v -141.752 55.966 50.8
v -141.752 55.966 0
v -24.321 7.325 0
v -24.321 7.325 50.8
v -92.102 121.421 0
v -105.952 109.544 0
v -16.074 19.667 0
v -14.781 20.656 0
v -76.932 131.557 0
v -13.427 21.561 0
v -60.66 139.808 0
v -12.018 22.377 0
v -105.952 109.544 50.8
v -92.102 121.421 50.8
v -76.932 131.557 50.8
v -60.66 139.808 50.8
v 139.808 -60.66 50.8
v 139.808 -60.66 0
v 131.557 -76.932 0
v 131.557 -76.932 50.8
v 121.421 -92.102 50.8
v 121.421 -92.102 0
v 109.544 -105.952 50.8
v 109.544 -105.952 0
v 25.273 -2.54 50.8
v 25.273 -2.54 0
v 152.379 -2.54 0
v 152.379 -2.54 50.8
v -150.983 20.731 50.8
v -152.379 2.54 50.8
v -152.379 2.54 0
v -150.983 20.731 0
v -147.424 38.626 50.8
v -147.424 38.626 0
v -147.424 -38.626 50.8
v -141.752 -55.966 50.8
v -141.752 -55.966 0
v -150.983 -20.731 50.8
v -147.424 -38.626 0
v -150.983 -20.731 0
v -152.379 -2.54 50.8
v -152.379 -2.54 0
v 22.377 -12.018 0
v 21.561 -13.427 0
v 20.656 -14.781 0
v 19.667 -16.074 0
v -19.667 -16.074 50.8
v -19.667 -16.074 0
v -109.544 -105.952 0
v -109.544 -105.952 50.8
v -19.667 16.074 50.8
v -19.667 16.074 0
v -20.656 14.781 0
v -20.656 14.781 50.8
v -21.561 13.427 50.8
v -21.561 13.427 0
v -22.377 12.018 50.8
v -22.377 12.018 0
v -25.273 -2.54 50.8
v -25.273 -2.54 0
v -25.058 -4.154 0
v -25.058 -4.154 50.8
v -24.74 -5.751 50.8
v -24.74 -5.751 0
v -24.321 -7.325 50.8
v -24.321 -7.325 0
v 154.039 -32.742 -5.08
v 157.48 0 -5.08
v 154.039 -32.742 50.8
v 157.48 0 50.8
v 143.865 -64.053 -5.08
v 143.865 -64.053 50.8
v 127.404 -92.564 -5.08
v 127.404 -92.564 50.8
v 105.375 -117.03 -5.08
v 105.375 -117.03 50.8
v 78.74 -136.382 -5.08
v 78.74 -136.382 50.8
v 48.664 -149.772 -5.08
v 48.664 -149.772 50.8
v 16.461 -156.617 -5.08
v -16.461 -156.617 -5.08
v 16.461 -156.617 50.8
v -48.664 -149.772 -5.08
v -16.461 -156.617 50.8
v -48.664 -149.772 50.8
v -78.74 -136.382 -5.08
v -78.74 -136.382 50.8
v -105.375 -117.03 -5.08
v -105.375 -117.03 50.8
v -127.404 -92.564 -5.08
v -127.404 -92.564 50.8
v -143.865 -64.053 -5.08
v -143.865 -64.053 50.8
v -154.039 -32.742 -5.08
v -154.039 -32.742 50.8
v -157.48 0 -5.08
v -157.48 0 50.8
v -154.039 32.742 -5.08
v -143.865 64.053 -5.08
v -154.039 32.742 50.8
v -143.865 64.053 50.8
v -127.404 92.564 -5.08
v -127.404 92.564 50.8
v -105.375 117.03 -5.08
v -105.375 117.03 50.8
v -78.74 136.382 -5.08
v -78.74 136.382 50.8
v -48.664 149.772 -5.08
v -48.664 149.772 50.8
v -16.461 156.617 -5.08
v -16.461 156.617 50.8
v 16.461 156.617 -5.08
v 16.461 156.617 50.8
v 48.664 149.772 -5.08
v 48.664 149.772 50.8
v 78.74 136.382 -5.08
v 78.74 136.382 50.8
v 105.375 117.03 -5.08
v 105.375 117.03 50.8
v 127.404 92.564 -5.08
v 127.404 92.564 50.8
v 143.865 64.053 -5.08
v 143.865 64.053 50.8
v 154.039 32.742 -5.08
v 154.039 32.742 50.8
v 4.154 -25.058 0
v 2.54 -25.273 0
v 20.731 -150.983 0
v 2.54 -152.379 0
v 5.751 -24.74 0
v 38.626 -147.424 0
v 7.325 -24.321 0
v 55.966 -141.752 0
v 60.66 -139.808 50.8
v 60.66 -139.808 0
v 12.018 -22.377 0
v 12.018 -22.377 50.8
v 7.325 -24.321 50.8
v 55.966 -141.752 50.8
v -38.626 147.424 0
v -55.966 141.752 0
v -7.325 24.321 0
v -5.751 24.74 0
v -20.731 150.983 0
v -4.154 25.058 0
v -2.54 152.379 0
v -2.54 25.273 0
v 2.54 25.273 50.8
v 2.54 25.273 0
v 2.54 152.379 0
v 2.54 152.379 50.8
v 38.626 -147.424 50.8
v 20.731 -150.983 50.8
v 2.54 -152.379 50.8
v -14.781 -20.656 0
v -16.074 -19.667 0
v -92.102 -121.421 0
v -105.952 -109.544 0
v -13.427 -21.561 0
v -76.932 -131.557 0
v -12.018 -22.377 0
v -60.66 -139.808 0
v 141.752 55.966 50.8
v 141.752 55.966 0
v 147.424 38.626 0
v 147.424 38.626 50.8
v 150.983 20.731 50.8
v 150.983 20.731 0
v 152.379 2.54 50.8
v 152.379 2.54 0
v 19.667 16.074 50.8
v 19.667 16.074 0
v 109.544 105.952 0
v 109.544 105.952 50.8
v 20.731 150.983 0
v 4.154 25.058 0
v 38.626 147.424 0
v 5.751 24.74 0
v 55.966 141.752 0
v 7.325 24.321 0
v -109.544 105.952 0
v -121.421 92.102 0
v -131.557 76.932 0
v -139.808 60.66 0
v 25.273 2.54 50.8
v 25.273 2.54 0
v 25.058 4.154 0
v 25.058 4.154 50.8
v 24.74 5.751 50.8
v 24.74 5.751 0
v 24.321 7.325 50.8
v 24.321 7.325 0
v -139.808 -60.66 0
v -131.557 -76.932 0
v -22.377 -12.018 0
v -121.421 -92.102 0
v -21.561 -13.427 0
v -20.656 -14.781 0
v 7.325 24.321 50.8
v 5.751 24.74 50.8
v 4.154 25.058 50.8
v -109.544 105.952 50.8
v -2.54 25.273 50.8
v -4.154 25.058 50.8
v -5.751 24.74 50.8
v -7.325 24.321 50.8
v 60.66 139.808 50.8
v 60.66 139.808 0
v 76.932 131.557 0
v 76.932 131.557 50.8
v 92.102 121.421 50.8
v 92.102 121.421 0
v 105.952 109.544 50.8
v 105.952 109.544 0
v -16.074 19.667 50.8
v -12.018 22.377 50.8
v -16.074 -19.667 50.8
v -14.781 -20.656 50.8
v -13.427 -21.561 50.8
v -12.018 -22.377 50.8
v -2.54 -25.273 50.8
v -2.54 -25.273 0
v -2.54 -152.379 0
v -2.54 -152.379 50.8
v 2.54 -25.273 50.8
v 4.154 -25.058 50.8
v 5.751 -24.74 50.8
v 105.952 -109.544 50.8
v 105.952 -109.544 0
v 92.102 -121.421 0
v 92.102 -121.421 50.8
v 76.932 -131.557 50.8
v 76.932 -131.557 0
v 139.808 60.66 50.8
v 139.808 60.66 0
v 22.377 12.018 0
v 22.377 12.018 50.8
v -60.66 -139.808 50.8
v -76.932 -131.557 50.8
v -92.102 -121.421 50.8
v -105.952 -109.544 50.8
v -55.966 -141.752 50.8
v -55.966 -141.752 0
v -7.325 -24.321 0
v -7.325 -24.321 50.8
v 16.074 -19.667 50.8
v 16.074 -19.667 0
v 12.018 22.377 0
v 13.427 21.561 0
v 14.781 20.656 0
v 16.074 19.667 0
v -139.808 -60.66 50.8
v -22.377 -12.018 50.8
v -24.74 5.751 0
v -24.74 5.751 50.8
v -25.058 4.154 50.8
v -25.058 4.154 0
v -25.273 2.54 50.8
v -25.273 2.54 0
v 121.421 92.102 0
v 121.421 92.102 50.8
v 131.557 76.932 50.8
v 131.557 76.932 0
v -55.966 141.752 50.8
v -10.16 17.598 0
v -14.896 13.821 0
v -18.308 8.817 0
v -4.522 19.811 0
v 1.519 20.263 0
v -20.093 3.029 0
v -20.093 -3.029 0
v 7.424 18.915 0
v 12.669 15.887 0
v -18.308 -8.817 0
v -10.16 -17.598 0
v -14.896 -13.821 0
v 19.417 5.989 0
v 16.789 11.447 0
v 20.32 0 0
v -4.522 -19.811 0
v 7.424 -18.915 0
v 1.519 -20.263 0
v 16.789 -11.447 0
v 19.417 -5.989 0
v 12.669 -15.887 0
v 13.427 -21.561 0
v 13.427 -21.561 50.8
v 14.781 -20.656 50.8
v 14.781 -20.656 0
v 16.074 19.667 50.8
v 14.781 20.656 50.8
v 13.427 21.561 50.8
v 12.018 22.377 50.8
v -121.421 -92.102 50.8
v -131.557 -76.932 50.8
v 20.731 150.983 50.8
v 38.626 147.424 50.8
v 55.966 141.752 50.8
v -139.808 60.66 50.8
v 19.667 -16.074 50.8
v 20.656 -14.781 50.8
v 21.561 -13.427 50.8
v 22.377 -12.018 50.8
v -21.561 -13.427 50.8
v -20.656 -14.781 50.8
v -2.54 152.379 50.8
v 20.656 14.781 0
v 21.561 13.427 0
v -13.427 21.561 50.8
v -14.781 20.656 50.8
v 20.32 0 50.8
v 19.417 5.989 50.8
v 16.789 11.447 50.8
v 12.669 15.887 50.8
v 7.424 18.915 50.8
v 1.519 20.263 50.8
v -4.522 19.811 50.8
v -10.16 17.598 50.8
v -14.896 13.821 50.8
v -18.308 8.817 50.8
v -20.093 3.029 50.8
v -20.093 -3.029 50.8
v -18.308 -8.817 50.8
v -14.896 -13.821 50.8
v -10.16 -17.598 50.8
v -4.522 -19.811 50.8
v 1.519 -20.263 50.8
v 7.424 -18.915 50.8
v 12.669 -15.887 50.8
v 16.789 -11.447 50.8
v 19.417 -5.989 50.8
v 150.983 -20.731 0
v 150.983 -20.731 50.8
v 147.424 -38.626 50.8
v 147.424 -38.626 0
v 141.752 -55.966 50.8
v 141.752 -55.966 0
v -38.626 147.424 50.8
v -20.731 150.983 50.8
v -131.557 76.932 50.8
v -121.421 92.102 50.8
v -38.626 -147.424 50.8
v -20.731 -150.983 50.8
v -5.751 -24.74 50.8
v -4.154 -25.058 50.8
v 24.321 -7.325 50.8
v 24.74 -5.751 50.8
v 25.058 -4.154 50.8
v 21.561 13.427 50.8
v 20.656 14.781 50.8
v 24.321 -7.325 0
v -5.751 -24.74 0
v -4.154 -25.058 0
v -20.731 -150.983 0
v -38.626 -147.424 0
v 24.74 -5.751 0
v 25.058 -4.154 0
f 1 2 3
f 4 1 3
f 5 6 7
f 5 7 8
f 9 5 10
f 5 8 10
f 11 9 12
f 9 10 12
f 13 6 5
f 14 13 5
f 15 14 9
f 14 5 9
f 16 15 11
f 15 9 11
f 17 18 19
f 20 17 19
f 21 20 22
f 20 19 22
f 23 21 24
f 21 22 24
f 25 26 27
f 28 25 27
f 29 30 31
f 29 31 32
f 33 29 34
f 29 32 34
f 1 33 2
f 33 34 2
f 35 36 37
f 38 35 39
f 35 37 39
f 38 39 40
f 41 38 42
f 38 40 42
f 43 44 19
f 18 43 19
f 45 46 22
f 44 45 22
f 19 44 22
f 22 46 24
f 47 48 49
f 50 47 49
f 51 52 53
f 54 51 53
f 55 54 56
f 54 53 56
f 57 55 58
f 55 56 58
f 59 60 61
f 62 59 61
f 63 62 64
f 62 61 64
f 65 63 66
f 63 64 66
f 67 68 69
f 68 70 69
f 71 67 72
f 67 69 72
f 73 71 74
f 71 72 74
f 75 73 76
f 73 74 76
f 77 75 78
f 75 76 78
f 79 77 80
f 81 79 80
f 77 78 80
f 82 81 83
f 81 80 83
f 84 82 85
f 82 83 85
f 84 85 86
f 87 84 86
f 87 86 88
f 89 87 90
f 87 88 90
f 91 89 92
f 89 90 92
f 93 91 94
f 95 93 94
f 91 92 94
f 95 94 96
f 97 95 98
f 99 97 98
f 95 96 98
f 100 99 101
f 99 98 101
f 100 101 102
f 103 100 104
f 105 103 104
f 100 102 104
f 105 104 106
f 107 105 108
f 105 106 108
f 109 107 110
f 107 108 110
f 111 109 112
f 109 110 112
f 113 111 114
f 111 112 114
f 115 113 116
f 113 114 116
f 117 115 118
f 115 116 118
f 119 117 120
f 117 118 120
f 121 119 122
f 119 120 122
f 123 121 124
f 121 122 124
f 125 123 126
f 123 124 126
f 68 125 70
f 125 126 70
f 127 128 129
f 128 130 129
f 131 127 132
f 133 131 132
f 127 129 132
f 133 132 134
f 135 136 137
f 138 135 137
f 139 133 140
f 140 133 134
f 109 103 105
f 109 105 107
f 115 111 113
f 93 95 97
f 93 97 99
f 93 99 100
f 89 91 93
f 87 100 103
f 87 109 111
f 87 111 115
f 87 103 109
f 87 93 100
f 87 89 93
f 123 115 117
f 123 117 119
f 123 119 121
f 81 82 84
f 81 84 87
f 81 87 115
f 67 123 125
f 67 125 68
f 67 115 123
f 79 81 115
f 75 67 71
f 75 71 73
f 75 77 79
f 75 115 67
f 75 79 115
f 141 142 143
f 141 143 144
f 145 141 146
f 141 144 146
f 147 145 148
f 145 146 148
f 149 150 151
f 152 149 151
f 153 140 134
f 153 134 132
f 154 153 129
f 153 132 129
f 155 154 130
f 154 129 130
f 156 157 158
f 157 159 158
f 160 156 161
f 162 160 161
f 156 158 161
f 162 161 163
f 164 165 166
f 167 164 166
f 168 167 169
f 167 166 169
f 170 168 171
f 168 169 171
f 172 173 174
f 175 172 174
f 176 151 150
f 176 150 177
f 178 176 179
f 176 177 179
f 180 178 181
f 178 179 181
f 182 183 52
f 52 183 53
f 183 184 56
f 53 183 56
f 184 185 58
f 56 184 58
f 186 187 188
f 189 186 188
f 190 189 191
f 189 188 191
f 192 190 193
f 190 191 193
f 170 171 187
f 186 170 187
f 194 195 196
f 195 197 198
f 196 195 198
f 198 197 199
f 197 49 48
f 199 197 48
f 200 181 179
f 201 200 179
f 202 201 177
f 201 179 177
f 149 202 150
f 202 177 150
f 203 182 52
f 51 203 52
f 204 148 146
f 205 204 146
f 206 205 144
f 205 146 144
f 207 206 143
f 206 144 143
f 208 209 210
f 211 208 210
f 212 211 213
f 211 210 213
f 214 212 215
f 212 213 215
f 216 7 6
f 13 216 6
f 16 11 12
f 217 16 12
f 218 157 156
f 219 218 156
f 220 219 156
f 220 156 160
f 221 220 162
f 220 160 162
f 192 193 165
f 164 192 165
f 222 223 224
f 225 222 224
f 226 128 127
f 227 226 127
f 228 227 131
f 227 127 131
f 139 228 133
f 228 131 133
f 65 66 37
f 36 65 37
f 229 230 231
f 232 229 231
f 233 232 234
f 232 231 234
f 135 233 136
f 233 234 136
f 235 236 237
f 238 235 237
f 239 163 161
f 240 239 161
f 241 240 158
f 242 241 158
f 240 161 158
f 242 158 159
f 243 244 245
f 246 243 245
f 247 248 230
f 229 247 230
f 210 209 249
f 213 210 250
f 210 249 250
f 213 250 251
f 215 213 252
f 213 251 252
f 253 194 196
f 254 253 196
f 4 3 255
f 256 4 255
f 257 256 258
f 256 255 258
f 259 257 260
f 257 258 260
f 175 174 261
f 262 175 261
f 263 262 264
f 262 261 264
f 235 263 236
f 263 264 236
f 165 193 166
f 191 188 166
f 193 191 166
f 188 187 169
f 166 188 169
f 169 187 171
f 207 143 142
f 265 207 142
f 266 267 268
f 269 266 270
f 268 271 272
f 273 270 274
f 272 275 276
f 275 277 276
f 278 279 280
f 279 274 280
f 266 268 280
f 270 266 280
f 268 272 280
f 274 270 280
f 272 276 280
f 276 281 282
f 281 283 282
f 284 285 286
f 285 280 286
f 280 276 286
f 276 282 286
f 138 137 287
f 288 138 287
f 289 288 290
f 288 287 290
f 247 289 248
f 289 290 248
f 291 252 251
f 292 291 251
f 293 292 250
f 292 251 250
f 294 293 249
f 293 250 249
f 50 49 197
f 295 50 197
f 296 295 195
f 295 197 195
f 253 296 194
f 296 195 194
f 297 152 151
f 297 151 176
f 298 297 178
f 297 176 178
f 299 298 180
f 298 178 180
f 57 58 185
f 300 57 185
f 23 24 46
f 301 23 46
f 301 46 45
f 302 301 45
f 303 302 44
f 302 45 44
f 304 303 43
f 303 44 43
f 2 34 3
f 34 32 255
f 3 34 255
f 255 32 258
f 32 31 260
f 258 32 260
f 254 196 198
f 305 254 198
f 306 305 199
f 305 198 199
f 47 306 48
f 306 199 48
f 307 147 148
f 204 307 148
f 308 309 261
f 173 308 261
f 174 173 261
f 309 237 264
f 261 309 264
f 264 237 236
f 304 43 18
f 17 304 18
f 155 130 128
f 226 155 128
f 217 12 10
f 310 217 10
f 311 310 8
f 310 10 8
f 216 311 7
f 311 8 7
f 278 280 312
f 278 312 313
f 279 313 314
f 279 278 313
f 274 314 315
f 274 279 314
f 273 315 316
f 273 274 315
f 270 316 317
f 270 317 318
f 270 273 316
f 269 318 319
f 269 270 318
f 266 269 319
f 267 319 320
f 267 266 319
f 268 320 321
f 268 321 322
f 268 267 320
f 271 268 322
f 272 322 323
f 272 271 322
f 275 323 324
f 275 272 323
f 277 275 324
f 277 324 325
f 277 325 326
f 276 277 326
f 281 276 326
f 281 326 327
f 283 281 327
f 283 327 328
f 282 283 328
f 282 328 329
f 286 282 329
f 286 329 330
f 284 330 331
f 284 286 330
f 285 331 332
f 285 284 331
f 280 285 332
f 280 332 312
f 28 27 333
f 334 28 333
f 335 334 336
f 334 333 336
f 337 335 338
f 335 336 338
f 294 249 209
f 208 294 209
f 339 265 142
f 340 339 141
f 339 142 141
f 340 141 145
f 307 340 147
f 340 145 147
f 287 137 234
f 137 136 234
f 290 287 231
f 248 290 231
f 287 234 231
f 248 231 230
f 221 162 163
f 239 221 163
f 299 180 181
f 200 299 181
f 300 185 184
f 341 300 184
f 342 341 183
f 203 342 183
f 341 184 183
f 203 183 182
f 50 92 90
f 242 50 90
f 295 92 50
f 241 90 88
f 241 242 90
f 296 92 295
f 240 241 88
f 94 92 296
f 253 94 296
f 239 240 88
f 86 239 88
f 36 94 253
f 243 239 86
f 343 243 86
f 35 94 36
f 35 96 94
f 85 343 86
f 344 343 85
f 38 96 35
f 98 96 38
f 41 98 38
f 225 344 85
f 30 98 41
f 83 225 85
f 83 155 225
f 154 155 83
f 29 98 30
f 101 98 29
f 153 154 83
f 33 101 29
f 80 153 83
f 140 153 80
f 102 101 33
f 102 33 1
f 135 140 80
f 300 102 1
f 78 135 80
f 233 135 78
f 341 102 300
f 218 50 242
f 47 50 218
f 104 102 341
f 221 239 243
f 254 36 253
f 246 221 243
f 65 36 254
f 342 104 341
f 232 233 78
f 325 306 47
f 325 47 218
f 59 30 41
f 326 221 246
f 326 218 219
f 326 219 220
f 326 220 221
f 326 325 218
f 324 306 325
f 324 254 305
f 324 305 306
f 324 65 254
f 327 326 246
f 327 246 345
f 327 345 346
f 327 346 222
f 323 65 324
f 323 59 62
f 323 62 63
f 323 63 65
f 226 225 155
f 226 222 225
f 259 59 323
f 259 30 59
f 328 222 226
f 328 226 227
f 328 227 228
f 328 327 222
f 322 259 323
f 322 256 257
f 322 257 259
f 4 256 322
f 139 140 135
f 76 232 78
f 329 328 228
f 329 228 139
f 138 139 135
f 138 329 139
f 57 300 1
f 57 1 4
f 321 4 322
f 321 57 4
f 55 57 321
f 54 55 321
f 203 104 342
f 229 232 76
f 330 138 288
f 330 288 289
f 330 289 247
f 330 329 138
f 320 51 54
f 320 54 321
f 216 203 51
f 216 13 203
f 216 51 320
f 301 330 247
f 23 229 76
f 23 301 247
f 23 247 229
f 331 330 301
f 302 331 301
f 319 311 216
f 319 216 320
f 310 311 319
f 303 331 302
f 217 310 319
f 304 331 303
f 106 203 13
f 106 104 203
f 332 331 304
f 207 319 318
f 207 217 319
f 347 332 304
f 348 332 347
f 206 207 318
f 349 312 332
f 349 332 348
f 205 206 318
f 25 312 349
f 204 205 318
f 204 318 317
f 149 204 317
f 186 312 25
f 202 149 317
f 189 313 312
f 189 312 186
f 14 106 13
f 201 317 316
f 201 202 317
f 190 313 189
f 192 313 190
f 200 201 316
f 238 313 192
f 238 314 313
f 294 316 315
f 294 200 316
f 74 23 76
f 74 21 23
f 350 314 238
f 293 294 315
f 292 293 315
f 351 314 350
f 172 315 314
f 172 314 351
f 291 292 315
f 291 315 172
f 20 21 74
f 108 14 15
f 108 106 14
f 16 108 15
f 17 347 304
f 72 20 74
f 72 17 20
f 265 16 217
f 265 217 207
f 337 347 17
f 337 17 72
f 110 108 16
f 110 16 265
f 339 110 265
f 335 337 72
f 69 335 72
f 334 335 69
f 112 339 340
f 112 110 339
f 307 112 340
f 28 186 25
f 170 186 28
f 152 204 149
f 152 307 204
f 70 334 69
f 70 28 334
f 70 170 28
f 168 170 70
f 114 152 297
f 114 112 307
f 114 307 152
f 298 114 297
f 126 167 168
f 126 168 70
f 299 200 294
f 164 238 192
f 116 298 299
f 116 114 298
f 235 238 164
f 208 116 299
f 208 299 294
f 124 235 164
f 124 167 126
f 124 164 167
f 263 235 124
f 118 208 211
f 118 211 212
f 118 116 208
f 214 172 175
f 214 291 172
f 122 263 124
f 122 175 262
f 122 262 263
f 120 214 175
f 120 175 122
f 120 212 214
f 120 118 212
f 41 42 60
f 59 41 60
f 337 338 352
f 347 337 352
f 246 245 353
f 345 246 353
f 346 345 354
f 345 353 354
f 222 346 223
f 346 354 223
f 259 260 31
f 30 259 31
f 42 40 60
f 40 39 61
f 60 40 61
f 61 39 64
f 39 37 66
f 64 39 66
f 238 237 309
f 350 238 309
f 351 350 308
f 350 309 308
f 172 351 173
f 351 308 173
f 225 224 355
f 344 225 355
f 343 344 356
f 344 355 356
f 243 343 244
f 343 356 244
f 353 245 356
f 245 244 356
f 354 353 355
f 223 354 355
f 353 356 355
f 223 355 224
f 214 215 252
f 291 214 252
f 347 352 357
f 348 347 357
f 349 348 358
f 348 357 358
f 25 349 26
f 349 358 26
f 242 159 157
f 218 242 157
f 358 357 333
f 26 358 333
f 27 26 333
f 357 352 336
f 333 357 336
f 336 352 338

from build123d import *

# Parameters (mm, degrees)
F0_R     = 157.48
F0_R_2   = 20.32
F1_DEPTH = 50.8
F2_R     = 157.48
F3_DEPTH = 5.08


with BuildPart() as f1:
    # F0 (on Top) → F1 (new body)
    with BuildSketch(Plane.XY):
        Circle(F0_R)
        with BuildLine():
            ThreePointArc((152.3788318632, 2.54), (152.3947078739, 1.2700441026), (152.4, 0))
            ThreePointArc((152.4, 0), (152.3947078739, -1.2700441026), (152.3788318632, -2.54))
            ThreePointArc((152.3788318632, -2.54), (149.4716767335, -29.7317650753), (141.7516998646, -55.9662003846))
            ThreePointArc((141.7516998646, -55.9662003846), (140.7992407547, -58.3209550924), (139.8076680282, -60.6595084097))
            ThreePointArc((139.8076680282, -60.6595084097), (126.7159689149, -84.6689035121), (109.544156544, -105.9520540955))
            ThreePointArc((109.544156544, -105.9520540955), (107.7630734528, -107.7630734528), (105.9520540956, -109.544156544))
            ThreePointArc((105.9520540956, -109.544156544), (84.6689035122, -126.7159689149), (60.6595084097, -139.8076680282))
            ThreePointArc((60.6595084097, -139.8076680282), (58.3209550924, -140.7992407547), (55.9662003846, -141.7516998646))
            ThreePointArc((55.9662003846, -141.7516998646), (29.7317650753, -149.4716767335), (2.54, -152.3788318632))
            ThreePointArc((2.54, -152.3788318632), (0, -152.4), (-2.54, -152.3788318632))
            ThreePointArc((-2.54, -152.3788318632), (-29.7317650753, -149.4716767335), (-55.9662003846, -141.7516998646))
            ThreePointArc((-55.9662003846, -141.7516998646), (-58.3209550924, -140.7992407547), (-60.6595084098, -139.8076680282))
            ThreePointArc((-60.6595084098, -139.8076680282), (-84.6689035122, -126.7159689149), (-105.9520540955, -109.544156544))
            ThreePointArc((-105.9520540955, -109.544156544), (-107.7630734528, -107.7630734528), (-109.544156544, -105.9520540955))
            ThreePointArc((-109.544156544, -105.9520540955), (-126.7159689149, -84.6689035122), (-139.8076680282, -60.6595084098))
            ThreePointArc((-139.8076680282, -60.6595084098), (-140.7992407547, -58.3209550924), (-141.7516998646, -55.9662003846))
            ThreePointArc((-141.7516998646, -55.9662003846), (-149.4716767335, -29.7317650752), (-152.3788318632, -2.54))
            ThreePointArc((-152.3788318632, -2.54), (-152.4, 0), (-152.3788318632, 2.54))
            ThreePointArc((-152.3788318632, 2.54), (-149.4716767335, 29.7317650752), (-141.7516998646, 55.9662003846))
            ThreePointArc((-141.7516998646, 55.9662003846), (-140.7992407547, 58.3209550924), (-139.8076680282, 60.6595084098))
            ThreePointArc((-139.8076680282, 60.6595084098), (-126.7159689149, 84.6689035122), (-109.544156544, 105.9520540955))
            ThreePointArc((-109.544156544, 105.9520540955), (-107.7630734529, 107.7630734528), (-105.9520540956, 109.544156544))
            ThreePointArc((-105.9520540956, 109.544156544), (-84.6689035122, 126.7159689149), (-60.6595084098, 139.8076680282))
            ThreePointArc((-60.6595084098, 139.8076680282), (-58.3209550924, 140.7992407547), (-55.9662003846, 141.7516998646))
            ThreePointArc((-55.9662003846, 141.7516998646), (-29.7317650752, 149.4716767335), (-2.54, 152.3788318632))
            ThreePointArc((-2.54, 152.3788318632), (0, 152.4), (2.54, 152.3788318632))
            ThreePointArc((2.54, 152.3788318632), (29.7317650752, 149.4716767335), (55.9662003846, 141.7516998646))
            ThreePointArc((55.9662003846, 141.7516998646), (58.3209550924, 140.7992407547), (60.6595084098, 139.8076680282))
            ThreePointArc((60.6595084098, 139.8076680282), (84.6689035122, 126.7159689149), (105.9520540956, 109.544156544))
            ThreePointArc((105.9520540956, 109.544156544), (107.7630734528, 107.7630734528), (109.544156544, 105.9520540956))
            ThreePointArc((109.544156544, 105.9520540956), (126.7159689149, 84.6689035122), (139.8076680282, 60.6595084098))
            ThreePointArc((139.8076680282, 60.6595084098), (140.7992407547, 58.3209550924), (141.7516998646, 55.9662003846))
            ThreePointArc((141.7516998646, 55.9662003846), (149.4716767335, 29.7317650753), (152.3788318632, 2.54))
        make_face(mode=Mode.SUBTRACT)
        with BuildLine():
            Line((-7.3247822603, 24.3209285357), (-55.9662003846, 141.7516998646))
            ThreePointArc((-55.9662003846, 141.7516998646), (-58.3209550924, 140.7992407547), (-60.6595084098, 139.8076680282))
            Line((-60.6595084098, 139.8076680282), (-12.0180902854, 22.3768966993))
            ThreePointArc((-12.0180902854, 22.3768966993), (-9.7201591821, 23.4665401258), (-7.3247822603, 24.3209285357))
        make_face()
        with BuildLine():
            Line((-16.0744328207, 19.6665352691), (-105.9520540956, 109.5441565439))
            ThreePointArc((-105.9520540956, 109.544156544), (-107.7630734529, 107.7630734528), (-109.544156544, 105.9520540955))
            Line((-109.544156544, 105.9520540955), (-19.6665352691, 16.0744328207))
            ThreePointArc((-19.6665352691, 16.0744328207), (-17.9605122421, 17.9605122421), (-16.0744328207, 19.6665352691))
        make_face()
        with BuildLine():
            Line((-22.3768966993, 12.0180902854), (-139.8076680282, 60.6595084098))
            ThreePointArc((-139.8076680282, 60.6595084098), (-140.7992407547, 58.3209550924), (-141.7516998646, 55.9662003846))
            Line((-141.7516998646, 55.9662003846), (-24.3209285357, 7.3247822603))
            ThreePointArc((-24.3209285357, 7.3247822603), (-23.4665401258, 9.7201591821), (-22.3768966993, 12.0180902854))
        make_face()
        with BuildLine():
            Line((-25.2726809025, 2.54), (-152.3788318632, 2.54))
            ThreePointArc((-152.3788318632, 2.54), (-152.4, 0), (-152.3788318632, -2.54))
            Line((-152.3788318632, -2.54), (-25.2726809025, -2.54))
            ThreePointArc((-25.2726809025, -2.54), (-25.4, 0), (-25.2726809025, 2.54))
        make_face()
        with BuildLine():
            ThreePointArc((-141.7516998646, -55.9662003846), (-140.7992407547, -58.3209550924), (-139.8076680282, -60.6595084098))
            Line((-139.8076680282, -60.6595084098), (-22.3768966993, -12.0180902854))
            ThreePointArc((-22.3768966993, -12.0180902854), (-23.4665401258, -9.7201591821), (-24.3209285357, -7.3247822603))
            Line((-24.3209285357, -7.3247822603), (-141.7516998646, -55.9662003846))
        make_face()
        with BuildLine():
            ThreePointArc((-109.544156544, -105.9520540955), (-107.7630734528, -107.7630734528), (-105.9520540955, -109.544156544))
            Line((-105.9520540955, -109.544156544), (-16.0744328207, -19.6665352692))
            ThreePointArc((-16.0744328207, -19.6665352692), (-17.9605122421, -17.9605122421), (-19.6665352691, -16.0744328207))
            Line((-19.6665352691, -16.0744328207), (-109.544156544, -105.9520540955))
        make_face()
        with BuildLine():
            ThreePointArc((-60.6595084098, -139.8076680282), (-58.3209550924, -140.7992407547), (-55.9662003846, -141.7516998646))
            Line((-55.9662003846, -141.7516998646), (-7.3247822603, -24.3209285357))
            ThreePointArc((-7.3247822603, -24.3209285357), (-9.7201591821, -23.4665401258), (-12.0180902854, -22.3768966993))
            Line((-12.0180902854, -22.3768966993), (-60.6595084098, -139.8076680282))
        make_face()
        with BuildLine():
            ThreePointArc((-2.54, -152.3788318632), (0, -152.4), (2.54, -152.3788318632))
            Line((2.54, -152.3788318632), (2.54, -25.2726809025))
            ThreePointArc((2.54, -25.2726809025), (0, -25.4), (-2.54, -25.2726809025))
            Line((-2.54, -25.2726809025), (-2.54, -152.3788318632))
        make_face()
        with BuildLine():
            ThreePointArc((55.9662003846, -141.7516998646), (58.3209550924, -140.7992407547), (60.6595084097, -139.8076680282))
            Line((60.6595084097, -139.8076680282), (12.0180902854, -22.3768966993))
            ThreePointArc((12.0180902854, -22.3768966993), (9.7201591821, -23.4665401258), (7.3247822603, -24.3209285357))
            Line((7.3247822603, -24.3209285357), (55.9662003846, -141.7516998646))
        make_face()
        with BuildLine():
            ThreePointArc((105.9520540956, -109.544156544), (107.7630734528, -107.7630734528), (109.544156544, -105.9520540955))
            Line((109.544156544, -105.9520540955), (19.6665352691, -16.0744328207))
            ThreePointArc((19.6665352691, -16.0744328207), (17.9605122421, -17.9605122421), (16.0744328207, -19.6665352691))
            Line((16.0744328207, -19.6665352691), (105.9520540956, -109.544156544))
        make_face()
        with BuildLine():
            ThreePointArc((139.8076680282, -60.6595084097), (140.7992407547, -58.3209550924), (141.7516998646, -55.9662003846))
            Line((141.7516998646, -55.9662003846), (24.3209285357, -7.3247822603))
            ThreePointArc((24.3209285357, -7.3247822603), (23.4665401258, -9.7201591821), (22.3768966993, -12.0180902854))
            Line((22.3768966993, -12.0180902854), (139.8076680282, -60.6595084097))
        make_face()
        with BuildLine():
            ThreePointArc((152.3788318632, -2.54), (152.3947078739, -1.2700441026), (152.4, 0))
            ThreePointArc((152.4, 0), (152.3947078739, 1.2700441026), (152.3788318632, 2.54))
            Line((152.3788318632, 2.54), (25.2726809025, 2.54))
            ThreePointArc((25.2726809025, 2.54), (25.368150257, 1.2715944865), (25.4, 0))
            ThreePointArc((25.4, 0), (25.368150257, -1.2715944865), (25.2726809025, -2.54))
            Line((25.2726809025, -2.54), (152.3788318632, -2.54))
        make_face()
        with BuildLine():
            Line((24.3209285357, 7.3247822603), (141.7516998646, 55.9662003846))
            ThreePointArc((141.7516998646, 55.9662003846), (140.7992407547, 58.3209550924), (139.8076680282, 60.6595084098))
            Line((139.8076680282, 60.6595084098), (22.3768966993, 12.0180902854))
            ThreePointArc((22.3768966993, 12.0180902854), (23.4665401258, 9.7201591821), (24.3209285357, 7.3247822603))
        make_face()
        with BuildLine():
            Line((19.6665352691, 16.0744328207), (109.544156544, 105.9520540956))
            ThreePointArc((109.544156544, 105.9520540956), (107.7630734528, 107.7630734528), (105.9520540956, 109.544156544))
            Line((105.9520540956, 109.544156544), (16.0744328207, 19.6665352691))
            ThreePointArc((16.0744328207, 19.6665352691), (17.9605122421, 17.9605122421), (19.6665352691, 16.0744328207))
        make_face()
        with BuildLine():
            Line((12.0180902854, 22.3768966993), (60.6595084098, 139.8076680282))
            ThreePointArc((60.6595084098, 139.8076680282), (58.3209550924, 140.7992407547), (55.9662003846, 141.7516998646))
            Line((55.9662003846, 141.7516998646), (7.3247822603, 24.3209285357))
            ThreePointArc((7.3247822603, 24.3209285357), (9.7201591821, 23.4665401258), (12.0180902854, 22.3768966993))
        make_face()
        with BuildLine():
            Line((2.54, 25.2726809025), (2.54, 152.3788318632))
            ThreePointArc((2.54, 152.3788318632), (0, 152.4), (-2.54, 152.3788318632))
            Line((-2.54, 152.3788318632), (-2.54, 25.2726809025))
            ThreePointArc((-2.54, 25.2726809025), (0, 25.4), (2.54, 25.2726809025))
        make_face()
        with BuildLine():
            ThreePointArc((25.4, 0), (25.368150257, 1.2715944865), (25.2726809025, 2.54))
            ThreePointArc((25.2726809025, 2.54), (24.9119461222, 4.9552941792), (24.3209285357, 7.3247822603))
            ThreePointArc((24.3209285357, 7.3247822603), (23.4665401258, 9.7201591821), (22.3768966993, 12.0180902854))
            ThreePointArc((22.3768966993, 12.0180902854), (21.1193281525, 14.1114839187), (19.6665352691, 16.0744328207))
            ThreePointArc((19.6665352691, 16.0744328207), (17.9605122421, 17.9605122421), (16.0744328207, 19.6665352691))
            ThreePointArc((16.0744328207, 19.6665352691), (14.1114839187, 21.1193281525), (12.0180902854, 22.3768966993))
            ThreePointArc((12.0180902854, 22.3768966993), (9.7201591821, 23.4665401258), (7.3247822603, 24.3209285357))
            ThreePointArc((7.3247822603, 24.3209285357), (4.9552941792, 24.9119461222), (2.54, 25.2726809025))
            ThreePointArc((2.54, 25.2726809025), (0, 25.4), (-2.54, 25.2726809025))
            ThreePointArc((-2.54, 25.2726809025), (-4.9552941792, 24.9119461222), (-7.3247822603, 24.3209285357))
            ThreePointArc((-7.3247822603, 24.3209285357), (-9.7201591821, 23.4665401258), (-12.0180902854, 22.3768966993))
            ThreePointArc((-12.0180902854, 22.3768966993), (-14.1114839187, 21.1193281525), (-16.0744328207, 19.6665352691))
            ThreePointArc((-16.0744328207, 19.6665352691), (-17.9605122421, 17.9605122421), (-19.6665352691, 16.0744328207))
            ThreePointArc((-19.6665352691, 16.0744328207), (-21.1193281525, 14.1114839187), (-22.3768966993, 12.0180902854))
            ThreePointArc((-22.3768966993, 12.0180902854), (-23.4665401258, 9.7201591821), (-24.3209285357, 7.3247822603))
            ThreePointArc((-24.3209285357, 7.3247822603), (-24.9119461222, 4.9552941792), (-25.2726809025, 2.54))
            ThreePointArc((-25.2726809025, 2.54), (-25.4, 0), (-25.2726809025, -2.54))
            ThreePointArc((-25.2726809025, -2.54), (-24.9119461222, -4.9552941792), (-24.3209285357, -7.3247822603))
            ThreePointArc((-24.3209285357, -7.3247822603), (-23.4665401258, -9.7201591821), (-22.3768966993, -12.0180902854))
            ThreePointArc((-22.3768966993, -12.0180902854), (-21.1193281525, -14.1114839187), (-19.6665352691, -16.0744328207))
            ThreePointArc((-19.6665352691, -16.0744328207), (-17.9605122421, -17.9605122421), (-16.0744328207, -19.6665352692))
            ThreePointArc((-16.0744328207, -19.6665352692), (-14.1114839187, -21.1193281525), (-12.0180902854, -22.3768966993))
            ThreePointArc((-12.0180902854, -22.3768966993), (-9.7201591821, -23.4665401258), (-7.3247822603, -24.3209285357))
            ThreePointArc((-7.3247822603, -24.3209285357), (-4.9552941792, -24.9119461222), (-2.54, -25.2726809025))
            ThreePointArc((-2.54, -25.2726809025), (0, -25.4), (2.54, -25.2726809025))
            ThreePointArc((2.54, -25.2726809025), (4.9552941792, -24.9119461222), (7.3247822603, -24.3209285357))
            ThreePointArc((7.3247822603, -24.3209285357), (9.7201591821, -23.4665401258), (12.0180902854, -22.3768966993))
            ThreePointArc((12.0180902854, -22.3768966993), (14.1114839187, -21.1193281525), (16.0744328207, -19.6665352691))
            ThreePointArc((16.0744328207, -19.6665352691), (17.9605122421, -17.9605122421), (19.6665352691, -16.0744328207))
            ThreePointArc((19.6665352691, -16.0744328207), (21.1193281525, -14.1114839187), (22.3768966993, -12.0180902854))
            ThreePointArc((22.3768966993, -12.0180902854), (23.4665401258, -9.7201591821), (24.3209285357, -7.3247822603))
            ThreePointArc((24.3209285357, -7.3247822603), (24.9119461222, -4.9552941792), (25.2726809025, -2.54))
            ThreePointArc((25.2726809025, -2.54), (25.368150257, -1.2715944865), (25.4, 0))
        make_face()
        Circle(F0_R_2, mode=Mode.SUBTRACT)
    extrude(amount=F1_DEPTH)

    # F2 (on face) → F3 (join)
    with BuildSketch(Plane(origin=(0, 0, 0), x_dir=(1, 0, 0), z_dir=(0, 0, -1))):
        Circle(F2_R)
    extrude(amount=F3_DEPTH)


solid = f1.part
